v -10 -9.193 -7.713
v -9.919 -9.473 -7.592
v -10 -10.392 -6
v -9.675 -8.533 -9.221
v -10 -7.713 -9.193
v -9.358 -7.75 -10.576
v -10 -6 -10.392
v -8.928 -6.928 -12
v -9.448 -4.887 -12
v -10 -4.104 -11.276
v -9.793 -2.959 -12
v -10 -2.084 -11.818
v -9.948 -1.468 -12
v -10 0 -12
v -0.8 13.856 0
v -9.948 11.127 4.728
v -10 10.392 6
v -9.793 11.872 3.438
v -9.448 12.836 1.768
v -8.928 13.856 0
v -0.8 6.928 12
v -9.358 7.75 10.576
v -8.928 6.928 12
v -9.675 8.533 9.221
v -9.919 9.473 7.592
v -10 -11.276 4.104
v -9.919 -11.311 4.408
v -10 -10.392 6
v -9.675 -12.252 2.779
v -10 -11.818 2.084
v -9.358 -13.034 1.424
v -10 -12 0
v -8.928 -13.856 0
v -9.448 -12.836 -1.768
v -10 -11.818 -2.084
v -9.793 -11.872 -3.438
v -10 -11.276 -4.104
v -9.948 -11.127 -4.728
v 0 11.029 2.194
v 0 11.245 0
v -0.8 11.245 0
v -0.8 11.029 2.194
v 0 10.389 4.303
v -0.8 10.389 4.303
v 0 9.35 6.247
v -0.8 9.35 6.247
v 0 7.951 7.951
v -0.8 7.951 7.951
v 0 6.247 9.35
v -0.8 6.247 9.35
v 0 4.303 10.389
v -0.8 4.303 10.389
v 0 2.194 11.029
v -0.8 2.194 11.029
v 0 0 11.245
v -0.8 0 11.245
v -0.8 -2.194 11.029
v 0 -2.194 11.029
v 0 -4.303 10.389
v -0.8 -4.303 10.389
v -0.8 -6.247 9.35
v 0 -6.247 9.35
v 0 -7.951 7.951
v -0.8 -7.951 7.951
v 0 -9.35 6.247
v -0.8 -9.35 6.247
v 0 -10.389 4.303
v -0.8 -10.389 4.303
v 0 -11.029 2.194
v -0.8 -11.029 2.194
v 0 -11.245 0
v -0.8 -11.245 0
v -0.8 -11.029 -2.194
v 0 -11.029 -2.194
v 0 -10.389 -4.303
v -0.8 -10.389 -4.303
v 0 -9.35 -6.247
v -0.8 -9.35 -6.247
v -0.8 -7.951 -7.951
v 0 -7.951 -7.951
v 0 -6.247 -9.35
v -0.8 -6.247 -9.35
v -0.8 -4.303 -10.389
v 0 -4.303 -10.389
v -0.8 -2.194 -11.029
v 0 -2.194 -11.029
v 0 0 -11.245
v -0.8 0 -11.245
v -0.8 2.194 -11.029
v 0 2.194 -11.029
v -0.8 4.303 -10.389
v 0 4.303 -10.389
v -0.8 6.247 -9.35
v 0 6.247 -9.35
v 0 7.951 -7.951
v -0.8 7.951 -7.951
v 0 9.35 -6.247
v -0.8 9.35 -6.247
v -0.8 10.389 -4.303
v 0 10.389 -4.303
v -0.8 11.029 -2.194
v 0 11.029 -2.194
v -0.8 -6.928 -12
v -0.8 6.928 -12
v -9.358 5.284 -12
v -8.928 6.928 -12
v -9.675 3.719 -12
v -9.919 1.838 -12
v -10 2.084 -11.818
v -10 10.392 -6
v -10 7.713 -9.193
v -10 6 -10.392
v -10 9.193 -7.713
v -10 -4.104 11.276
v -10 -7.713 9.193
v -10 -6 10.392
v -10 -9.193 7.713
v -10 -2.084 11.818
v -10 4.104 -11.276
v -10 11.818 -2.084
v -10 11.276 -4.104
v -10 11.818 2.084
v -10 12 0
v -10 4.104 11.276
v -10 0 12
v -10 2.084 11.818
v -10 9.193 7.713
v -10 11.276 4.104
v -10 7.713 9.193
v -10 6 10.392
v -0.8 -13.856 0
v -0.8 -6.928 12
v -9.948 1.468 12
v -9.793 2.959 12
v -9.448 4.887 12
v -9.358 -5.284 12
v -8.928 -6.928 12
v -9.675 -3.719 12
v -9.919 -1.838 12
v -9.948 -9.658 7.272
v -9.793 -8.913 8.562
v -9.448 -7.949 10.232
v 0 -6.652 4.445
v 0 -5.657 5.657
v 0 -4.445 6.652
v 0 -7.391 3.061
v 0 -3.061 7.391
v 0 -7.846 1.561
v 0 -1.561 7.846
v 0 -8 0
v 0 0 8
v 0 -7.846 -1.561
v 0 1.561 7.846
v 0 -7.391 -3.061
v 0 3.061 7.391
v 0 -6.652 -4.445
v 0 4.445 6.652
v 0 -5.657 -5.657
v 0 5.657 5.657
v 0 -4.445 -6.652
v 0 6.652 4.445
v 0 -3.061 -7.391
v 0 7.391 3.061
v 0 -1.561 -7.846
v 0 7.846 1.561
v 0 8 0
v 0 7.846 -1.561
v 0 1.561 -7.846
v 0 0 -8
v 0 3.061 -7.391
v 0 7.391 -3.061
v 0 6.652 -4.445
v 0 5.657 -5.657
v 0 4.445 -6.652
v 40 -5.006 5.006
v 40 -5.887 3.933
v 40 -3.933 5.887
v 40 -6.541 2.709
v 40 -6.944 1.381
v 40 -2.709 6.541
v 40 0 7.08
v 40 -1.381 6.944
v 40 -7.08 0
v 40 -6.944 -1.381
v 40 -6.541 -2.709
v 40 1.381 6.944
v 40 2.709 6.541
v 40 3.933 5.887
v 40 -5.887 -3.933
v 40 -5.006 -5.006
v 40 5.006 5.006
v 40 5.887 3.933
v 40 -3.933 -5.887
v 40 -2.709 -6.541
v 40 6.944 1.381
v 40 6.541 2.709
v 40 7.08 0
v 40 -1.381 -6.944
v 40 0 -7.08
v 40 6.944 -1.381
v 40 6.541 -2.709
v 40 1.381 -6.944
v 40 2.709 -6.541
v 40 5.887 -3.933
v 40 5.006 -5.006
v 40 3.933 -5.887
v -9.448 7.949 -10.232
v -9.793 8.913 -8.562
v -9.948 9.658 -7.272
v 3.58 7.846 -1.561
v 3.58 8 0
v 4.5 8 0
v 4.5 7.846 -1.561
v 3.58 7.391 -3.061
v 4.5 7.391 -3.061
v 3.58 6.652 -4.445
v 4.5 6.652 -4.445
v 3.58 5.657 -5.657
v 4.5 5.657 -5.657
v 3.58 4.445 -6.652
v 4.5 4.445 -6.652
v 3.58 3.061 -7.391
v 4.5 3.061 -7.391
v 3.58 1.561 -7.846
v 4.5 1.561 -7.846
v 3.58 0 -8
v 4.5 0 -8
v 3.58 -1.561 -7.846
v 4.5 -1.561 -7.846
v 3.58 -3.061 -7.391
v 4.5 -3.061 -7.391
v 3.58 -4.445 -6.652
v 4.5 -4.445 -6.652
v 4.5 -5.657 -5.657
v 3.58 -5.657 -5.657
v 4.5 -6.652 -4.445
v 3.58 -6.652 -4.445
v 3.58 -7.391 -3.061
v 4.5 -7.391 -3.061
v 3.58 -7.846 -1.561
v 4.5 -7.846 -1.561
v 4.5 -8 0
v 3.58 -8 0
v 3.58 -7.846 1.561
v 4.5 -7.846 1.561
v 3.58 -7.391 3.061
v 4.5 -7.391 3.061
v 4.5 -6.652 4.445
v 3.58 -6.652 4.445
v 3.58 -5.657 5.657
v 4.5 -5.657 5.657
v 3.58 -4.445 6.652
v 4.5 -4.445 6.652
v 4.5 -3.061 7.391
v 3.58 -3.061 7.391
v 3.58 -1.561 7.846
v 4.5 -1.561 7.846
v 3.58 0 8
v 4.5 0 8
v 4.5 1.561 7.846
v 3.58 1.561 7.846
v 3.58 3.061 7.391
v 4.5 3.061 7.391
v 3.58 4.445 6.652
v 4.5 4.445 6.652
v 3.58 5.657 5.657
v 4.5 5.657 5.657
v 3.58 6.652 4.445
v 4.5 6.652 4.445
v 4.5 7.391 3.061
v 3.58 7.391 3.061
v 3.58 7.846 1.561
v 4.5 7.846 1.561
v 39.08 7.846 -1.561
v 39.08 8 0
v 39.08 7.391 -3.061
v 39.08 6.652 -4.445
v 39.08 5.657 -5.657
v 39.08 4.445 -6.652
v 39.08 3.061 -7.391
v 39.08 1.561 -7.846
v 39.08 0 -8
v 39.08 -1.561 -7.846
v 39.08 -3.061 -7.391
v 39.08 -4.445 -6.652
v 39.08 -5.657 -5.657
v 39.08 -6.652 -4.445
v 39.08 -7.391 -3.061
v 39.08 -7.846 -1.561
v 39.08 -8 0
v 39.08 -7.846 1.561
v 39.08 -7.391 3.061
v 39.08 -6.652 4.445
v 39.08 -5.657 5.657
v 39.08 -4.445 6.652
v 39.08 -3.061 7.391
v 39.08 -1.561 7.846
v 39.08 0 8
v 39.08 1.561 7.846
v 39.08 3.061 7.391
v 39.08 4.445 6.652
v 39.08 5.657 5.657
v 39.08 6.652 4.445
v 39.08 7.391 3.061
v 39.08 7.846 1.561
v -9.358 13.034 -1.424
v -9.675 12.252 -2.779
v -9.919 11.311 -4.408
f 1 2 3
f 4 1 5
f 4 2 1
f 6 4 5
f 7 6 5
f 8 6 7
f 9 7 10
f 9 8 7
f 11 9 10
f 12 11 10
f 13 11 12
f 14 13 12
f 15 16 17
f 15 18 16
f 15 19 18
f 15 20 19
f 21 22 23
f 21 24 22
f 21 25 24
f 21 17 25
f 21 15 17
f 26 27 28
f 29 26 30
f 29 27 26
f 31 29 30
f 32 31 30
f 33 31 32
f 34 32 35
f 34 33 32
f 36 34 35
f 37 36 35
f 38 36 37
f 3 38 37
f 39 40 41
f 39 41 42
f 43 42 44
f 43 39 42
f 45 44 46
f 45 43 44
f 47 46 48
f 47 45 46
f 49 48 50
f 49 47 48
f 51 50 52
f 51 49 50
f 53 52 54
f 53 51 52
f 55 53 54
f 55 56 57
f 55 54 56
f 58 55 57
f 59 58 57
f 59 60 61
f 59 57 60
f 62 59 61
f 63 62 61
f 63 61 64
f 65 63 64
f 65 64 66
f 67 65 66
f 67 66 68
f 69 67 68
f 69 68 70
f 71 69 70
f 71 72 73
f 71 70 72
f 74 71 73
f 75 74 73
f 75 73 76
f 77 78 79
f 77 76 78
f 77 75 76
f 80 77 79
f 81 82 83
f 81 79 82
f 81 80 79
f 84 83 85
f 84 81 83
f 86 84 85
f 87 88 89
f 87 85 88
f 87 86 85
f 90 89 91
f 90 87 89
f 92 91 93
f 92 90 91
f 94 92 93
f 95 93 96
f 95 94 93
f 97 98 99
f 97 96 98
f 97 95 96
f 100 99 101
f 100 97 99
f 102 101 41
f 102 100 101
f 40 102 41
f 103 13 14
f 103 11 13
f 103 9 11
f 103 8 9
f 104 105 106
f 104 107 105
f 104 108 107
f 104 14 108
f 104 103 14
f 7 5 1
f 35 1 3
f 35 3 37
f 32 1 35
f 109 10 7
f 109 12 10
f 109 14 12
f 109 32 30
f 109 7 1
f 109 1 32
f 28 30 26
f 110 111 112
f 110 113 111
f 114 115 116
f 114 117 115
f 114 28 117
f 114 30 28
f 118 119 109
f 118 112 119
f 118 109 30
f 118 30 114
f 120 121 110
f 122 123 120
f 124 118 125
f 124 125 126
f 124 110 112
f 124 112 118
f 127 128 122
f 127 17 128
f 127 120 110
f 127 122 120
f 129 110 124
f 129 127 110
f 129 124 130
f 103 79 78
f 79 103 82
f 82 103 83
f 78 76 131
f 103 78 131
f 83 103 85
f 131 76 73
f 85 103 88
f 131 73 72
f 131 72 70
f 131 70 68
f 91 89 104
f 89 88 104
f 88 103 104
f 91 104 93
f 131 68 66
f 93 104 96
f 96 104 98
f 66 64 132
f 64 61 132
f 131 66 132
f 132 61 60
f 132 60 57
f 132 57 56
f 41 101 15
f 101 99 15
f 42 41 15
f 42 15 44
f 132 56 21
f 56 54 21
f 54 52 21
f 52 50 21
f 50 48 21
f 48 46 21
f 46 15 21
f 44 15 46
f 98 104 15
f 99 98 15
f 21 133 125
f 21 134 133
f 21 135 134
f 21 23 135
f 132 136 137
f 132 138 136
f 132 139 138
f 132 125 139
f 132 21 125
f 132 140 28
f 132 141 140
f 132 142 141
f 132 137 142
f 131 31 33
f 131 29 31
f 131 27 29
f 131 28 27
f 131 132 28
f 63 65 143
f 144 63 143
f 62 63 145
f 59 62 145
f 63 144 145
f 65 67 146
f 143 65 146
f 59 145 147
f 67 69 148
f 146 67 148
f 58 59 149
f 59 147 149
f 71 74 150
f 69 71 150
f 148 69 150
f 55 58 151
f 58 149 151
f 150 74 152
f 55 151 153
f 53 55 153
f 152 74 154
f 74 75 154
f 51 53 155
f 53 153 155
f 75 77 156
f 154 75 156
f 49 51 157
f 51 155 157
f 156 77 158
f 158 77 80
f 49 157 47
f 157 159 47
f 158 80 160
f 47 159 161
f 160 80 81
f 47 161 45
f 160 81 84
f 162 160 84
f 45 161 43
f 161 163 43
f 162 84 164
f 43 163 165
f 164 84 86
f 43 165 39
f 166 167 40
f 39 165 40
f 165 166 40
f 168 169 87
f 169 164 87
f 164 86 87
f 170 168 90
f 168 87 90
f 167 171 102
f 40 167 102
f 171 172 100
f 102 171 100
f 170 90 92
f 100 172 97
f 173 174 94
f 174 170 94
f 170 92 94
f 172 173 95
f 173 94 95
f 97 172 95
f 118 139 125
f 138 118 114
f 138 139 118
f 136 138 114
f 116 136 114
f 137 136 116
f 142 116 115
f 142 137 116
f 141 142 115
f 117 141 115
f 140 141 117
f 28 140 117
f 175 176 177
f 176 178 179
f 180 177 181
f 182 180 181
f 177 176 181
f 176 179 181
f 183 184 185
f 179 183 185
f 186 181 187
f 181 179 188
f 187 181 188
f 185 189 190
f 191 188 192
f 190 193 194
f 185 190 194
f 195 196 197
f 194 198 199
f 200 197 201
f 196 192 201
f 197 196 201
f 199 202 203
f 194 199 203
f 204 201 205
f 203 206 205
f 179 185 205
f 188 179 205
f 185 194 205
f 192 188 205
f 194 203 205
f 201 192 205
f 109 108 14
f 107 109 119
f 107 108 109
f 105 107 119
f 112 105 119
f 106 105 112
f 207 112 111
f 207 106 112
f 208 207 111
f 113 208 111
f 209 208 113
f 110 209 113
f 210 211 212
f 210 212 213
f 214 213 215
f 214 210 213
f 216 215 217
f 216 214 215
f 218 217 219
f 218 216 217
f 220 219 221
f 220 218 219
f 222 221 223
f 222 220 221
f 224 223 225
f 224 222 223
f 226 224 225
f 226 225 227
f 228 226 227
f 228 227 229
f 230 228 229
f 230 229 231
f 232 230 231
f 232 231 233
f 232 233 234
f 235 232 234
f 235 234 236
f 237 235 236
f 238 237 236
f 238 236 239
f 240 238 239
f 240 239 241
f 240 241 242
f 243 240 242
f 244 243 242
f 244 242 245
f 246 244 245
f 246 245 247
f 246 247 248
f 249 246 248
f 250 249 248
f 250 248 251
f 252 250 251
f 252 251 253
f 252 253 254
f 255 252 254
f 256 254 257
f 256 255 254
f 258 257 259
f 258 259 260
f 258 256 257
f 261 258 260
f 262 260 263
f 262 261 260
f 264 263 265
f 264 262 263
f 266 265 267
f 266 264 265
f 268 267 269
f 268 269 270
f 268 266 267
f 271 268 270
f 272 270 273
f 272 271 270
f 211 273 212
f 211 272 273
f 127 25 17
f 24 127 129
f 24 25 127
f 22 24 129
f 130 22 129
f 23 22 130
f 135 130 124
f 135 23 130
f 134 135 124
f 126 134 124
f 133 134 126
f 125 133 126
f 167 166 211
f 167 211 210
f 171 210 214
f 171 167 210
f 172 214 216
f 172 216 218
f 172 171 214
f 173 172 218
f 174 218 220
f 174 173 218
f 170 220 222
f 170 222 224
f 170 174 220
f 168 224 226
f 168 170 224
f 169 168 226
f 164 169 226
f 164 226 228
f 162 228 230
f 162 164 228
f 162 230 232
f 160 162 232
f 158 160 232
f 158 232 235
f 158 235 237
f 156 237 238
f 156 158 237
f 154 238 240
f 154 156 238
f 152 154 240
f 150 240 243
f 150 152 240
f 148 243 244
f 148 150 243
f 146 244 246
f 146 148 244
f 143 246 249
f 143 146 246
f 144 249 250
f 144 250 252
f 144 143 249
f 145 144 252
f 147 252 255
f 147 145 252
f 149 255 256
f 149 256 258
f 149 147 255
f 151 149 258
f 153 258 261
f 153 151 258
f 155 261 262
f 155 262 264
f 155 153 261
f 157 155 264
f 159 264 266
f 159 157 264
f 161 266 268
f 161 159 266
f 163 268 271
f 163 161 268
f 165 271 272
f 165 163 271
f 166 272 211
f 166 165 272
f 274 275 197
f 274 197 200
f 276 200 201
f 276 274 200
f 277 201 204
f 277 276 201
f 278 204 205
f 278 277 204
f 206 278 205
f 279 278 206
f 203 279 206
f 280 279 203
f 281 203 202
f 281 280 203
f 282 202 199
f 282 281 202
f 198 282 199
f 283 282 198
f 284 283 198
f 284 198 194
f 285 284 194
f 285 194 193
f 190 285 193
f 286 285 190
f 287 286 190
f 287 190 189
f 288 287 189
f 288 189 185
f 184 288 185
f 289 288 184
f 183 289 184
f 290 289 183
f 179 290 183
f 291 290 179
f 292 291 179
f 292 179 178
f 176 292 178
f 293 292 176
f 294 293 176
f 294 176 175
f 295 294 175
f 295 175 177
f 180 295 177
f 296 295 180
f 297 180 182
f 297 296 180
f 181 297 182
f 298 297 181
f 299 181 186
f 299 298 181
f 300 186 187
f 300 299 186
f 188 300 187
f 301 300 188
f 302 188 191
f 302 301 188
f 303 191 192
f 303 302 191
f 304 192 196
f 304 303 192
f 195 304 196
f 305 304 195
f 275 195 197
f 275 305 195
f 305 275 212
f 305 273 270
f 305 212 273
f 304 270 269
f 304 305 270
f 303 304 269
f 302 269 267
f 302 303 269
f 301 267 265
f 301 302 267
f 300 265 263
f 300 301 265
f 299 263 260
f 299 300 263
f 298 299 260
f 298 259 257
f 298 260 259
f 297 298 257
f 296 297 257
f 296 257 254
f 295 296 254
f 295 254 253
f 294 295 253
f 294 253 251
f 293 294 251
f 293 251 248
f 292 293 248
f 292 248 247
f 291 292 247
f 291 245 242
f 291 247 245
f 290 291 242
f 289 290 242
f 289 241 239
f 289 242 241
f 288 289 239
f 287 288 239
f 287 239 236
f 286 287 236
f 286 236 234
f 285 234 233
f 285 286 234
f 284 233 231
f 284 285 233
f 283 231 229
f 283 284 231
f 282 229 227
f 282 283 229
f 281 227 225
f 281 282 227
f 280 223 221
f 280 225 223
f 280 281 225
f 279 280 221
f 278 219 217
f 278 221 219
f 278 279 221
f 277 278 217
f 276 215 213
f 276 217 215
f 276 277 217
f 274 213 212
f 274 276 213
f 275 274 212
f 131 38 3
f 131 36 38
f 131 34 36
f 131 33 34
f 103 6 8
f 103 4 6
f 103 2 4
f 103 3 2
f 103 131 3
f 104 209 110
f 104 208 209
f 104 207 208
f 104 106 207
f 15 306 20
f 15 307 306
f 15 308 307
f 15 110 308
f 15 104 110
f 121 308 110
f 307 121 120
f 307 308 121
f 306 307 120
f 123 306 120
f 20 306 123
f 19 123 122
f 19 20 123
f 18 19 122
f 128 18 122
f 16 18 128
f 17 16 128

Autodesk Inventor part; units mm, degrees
ref_plane "YZ Plane" through (0, 0, 0) normal (1, 0, 0) x (0, 1, 0)
ref_plane "XZ Plane" through (0, 0, 0) normal (0, 1, 0) x (-1, 0, 0)
sketch "Sketch1" plane through (0, 0, 0) normal (0, 0, 1) x (1, 0, 0)
  line L0 (0, 11.245) -> (0, 8)
  line L1 (4.5, 8) -> (40, 8)
  line L2 (40, 8) -> (40, 0)
  line L3 (40, 0) -> (-0.8001, 0)
  line L4 (-8.9601, 0) -> (48.16, 0) projected
  line L5 (-0.8001, 0) -> (-0.8001, 11.245)
  line L6 (-0.8001, 11.245) -> (0, 11.245)
  line L7 (4.5, 8) -> (3.5797, 8)
  line L8 (3.5797, 8) -> (0, 8)
  line L9 (0, -2.249) -> (0, 13.494) projected
  dimension "d0" = 40
  dimension "d1" = 35.5
  dimension "d2" = 16
  dimension "d9" = 0.8001
  dimension "d10" = 22.49
  dimension "d13" = 0.9203
  dimension "d14" = 16
revolve "Body" add sketch "Sketch1" angle 360 about axis through (40, 0, 0) along (-1, 0, 0)
sketch "Sketch2" plane through (-0.8001, 0, 0) normal (-1, 0, 0) x (0, 0, 1)
  line L0 (0, 13.8564) -> (12, 6.9282)
  line L1 (12, 6.9282) -> (12, -6.9282)
  line L2 (12, -6.9282) -> (0, -13.8564)
  line L3 (0, -13.8564) -> (-12, -6.9282)
  line L4 (-12, -6.9282) -> (-12, 6.9282)
  line L5 (-12, 6.9282) -> (0, 13.8564)
  point P0 (0, 0)
  point P1 (0, 0)
  dimension "d11" = 24
extrude "Head" add sketch "Sketch2" along normal blind 9.2
sketch "Sketch4" plane through (0, 0, 0) normal (0, 0, 1) x (1, 0, 0)
  line L0 (-10.0001, 12) -> (-10.0001, 13.8564)
  line L1 (-10.0001, 13.8564) -> (-8.9283, 13.8564)
  line L2 (-8.9283, 13.8564) -> (-10.0001, 12)
  line L3 (-11.8401, 0) -> (1.0399, 0) projected
  line L4 (-0.8001, 13.8564) -> (-10.0001, 13.8564) projected
  line L5 (-10.0001, 6.9282) -> (-10.0001, 13.8564) projected
  dimension "d5" = 30
  dimension "d19" = 24
revolve "Chamfer1" cut sketch "Sketch4" angle 360 about axis through (-10, 0, 0) along (1, 0, 0)
thread "Thread" size "M16x1.5" class "6g" standard "ISO Metric profile" length 35.5
chamfer "Chamfer2" distance 0.9202 distance2 0.9203 1 edges at (40, -8, 0) measured on face at (40, -0.1598, 1.3157)
ref_plane "Work Plane1" through (1.525, 0, 0) normal (0, 0, 1) x (1, 0, 0)
equation "\"d11\" = SW"
equation "\"d3\" = KOH - SD"
equation "\"d15\" = GEL"
equation "\"d6\" = -0.5 * SPD + 0.5 * GD"
equation "\"d0\" = NLG"
equation "\"d1\" = GEL"
equation "\"d2\" = GD"
equation "\"d10\" = SD2"
equation "\"d14\" = BDM"
equation "\"d5\" = ANG1"
equation "\"d19\" = SW0"
equation "\"NLG\" = 40"
equation "\"GD\" = NND"
equation "\"BDM\" = NND"
equation "\"KOH\" = 10"
equation "\"GEL\" = 35.5"
equation "\"SW\" = 24"
equation "\"SW0\" = 24"
equation "\"SPD\" = NND - 1.2269 * PTC"
equation "\"SD2\" = 22.49"
equation "\"SD\" = 0.8"
equation "\"ANG1\" = 30deg"
equation "\"GAL\" = 0.61345 * PTC"
equation "\"GUL\" = 0.61345 * PTC"
equation "\"RR\" = 0.6"
equation "\"GD1\" = THREADDIA - 1.2269 * PTC"
equation "\"THREADDIA\" = 16"
equation "\"SDH\" = SD2"
equation "\"TOA\" = 30deg"
equation "\"PTC\" = 1.5"
equation "\"NND\" = 16"
equation "\"E0\" = 1.155 * SW"
properties part number "ISO 8676 - M16 x 1,5 x 40" material "Stainless Steel, 440C"
